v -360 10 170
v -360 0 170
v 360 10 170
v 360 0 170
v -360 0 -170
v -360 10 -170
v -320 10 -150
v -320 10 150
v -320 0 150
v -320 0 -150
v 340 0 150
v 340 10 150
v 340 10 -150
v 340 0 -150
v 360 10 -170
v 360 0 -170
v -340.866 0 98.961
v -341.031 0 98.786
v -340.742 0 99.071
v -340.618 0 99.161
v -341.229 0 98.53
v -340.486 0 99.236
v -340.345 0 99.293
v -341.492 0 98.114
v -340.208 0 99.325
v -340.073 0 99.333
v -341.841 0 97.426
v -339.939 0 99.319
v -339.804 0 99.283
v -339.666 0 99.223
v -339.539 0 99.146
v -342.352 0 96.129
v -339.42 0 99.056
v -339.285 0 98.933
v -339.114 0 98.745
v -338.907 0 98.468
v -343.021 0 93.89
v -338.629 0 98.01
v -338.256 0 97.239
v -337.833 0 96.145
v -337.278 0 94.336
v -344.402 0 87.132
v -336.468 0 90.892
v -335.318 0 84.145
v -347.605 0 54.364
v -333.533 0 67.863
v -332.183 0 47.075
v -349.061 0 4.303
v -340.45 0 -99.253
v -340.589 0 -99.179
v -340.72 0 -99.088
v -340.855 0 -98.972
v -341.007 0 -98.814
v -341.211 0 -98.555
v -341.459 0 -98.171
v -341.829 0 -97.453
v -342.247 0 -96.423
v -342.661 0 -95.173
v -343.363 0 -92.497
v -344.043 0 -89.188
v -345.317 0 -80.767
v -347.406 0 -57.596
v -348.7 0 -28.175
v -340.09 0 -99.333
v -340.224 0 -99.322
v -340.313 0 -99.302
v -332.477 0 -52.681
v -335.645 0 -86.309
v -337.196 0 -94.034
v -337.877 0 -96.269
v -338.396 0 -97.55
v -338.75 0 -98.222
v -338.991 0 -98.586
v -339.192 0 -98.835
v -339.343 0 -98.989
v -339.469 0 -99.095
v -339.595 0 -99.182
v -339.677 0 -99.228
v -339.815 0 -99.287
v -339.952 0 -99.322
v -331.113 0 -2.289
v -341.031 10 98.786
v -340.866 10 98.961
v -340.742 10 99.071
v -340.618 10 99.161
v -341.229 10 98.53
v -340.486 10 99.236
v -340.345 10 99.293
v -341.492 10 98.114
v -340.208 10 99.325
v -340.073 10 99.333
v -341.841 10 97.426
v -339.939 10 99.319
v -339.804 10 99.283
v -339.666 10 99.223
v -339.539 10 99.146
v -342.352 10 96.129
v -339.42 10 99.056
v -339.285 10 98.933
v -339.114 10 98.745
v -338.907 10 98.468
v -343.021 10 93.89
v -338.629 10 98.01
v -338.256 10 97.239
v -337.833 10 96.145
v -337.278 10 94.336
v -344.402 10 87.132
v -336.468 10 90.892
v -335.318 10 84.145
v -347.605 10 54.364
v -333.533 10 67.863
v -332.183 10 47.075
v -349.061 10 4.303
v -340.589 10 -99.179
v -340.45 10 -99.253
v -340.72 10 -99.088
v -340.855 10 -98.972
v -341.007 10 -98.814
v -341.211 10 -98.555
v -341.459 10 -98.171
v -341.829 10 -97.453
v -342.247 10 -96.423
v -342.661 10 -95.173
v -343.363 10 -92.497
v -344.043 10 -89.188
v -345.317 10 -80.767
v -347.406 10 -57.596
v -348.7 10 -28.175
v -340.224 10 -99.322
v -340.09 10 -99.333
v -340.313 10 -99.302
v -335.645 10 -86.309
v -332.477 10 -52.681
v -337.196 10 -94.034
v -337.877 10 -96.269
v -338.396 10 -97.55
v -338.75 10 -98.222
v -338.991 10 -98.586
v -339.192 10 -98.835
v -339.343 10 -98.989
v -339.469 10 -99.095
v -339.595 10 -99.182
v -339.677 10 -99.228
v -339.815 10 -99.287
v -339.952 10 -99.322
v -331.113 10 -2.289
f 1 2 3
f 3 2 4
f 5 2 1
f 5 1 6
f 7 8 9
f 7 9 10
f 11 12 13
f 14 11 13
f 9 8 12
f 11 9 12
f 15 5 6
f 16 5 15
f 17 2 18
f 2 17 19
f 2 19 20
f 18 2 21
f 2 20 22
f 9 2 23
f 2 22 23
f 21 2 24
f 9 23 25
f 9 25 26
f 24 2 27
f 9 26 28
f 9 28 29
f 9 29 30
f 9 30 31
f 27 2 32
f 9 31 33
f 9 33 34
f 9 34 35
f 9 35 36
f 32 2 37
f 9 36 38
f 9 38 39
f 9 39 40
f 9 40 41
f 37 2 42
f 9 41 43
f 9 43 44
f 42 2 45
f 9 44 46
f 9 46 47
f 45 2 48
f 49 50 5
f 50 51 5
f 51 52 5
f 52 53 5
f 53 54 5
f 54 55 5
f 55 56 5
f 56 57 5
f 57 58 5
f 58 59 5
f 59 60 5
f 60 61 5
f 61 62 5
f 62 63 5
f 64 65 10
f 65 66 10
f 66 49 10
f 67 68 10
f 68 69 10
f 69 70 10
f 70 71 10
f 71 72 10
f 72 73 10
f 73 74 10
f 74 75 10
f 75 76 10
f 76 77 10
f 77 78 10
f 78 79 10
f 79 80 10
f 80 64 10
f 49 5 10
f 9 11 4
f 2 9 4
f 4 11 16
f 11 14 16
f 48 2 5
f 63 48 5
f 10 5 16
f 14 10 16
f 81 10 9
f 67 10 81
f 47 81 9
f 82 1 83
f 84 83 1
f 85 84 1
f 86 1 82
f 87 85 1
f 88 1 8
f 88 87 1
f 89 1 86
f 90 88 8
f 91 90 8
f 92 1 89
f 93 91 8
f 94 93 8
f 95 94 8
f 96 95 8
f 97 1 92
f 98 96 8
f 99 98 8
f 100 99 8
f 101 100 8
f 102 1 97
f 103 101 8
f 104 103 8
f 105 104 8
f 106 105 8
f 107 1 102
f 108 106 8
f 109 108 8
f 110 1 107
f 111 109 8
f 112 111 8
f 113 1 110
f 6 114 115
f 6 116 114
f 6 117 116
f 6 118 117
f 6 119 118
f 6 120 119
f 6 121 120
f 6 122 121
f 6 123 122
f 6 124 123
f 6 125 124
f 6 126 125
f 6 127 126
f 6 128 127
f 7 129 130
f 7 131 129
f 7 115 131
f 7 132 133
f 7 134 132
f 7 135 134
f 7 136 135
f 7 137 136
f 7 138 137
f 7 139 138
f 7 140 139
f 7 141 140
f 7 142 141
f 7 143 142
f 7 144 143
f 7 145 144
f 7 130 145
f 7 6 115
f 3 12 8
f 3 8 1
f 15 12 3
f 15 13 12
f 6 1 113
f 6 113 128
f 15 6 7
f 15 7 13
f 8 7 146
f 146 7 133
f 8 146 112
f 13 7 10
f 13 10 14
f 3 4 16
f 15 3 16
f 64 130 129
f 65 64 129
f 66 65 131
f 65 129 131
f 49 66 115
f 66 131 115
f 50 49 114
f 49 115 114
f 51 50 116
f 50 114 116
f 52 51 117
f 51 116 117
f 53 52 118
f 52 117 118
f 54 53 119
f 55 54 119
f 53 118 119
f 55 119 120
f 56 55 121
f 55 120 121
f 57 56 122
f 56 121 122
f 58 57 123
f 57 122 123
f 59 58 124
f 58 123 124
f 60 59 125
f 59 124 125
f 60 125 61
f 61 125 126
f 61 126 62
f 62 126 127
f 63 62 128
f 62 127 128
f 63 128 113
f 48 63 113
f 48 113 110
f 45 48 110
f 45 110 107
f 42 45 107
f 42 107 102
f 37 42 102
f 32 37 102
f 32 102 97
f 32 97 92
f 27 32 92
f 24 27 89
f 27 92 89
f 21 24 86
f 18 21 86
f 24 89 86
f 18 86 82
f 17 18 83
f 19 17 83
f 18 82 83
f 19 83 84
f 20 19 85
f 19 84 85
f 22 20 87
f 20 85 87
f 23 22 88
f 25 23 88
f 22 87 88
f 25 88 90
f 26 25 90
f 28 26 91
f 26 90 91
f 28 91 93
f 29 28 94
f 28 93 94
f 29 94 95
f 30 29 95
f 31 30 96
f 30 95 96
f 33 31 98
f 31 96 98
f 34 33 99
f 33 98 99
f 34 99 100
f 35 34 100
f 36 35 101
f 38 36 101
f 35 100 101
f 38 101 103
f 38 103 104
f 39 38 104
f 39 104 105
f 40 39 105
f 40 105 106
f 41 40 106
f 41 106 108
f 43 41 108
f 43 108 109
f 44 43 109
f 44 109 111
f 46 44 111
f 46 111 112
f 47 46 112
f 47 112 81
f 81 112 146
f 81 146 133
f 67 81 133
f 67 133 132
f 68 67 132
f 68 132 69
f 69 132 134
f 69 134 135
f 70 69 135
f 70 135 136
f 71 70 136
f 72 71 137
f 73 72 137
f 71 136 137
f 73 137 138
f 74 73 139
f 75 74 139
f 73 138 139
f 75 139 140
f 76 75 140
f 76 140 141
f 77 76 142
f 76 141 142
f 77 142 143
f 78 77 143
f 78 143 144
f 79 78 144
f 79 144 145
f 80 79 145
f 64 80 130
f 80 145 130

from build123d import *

# Parameters (mm, degrees)
CROQUIS1_W              = 720
CROQUIS1_H              = 340
SALIENTE_EXTRUIR1_DEPTH = 10
CROQUIS3_RX             = 99.333174073
CROQUIS3_RY             = 8.979269973
CROQUIS3_W              = 660
CROQUIS3_H              = 300
CORTAR_EXTRUIR2_DEPTH   = 10


with BuildPart() as part:
    # Croquis1 → Saliente-Extruir1 (new body)
    with BuildSketch(Plane(origin=(0, 0, 0), x_dir=(1, 0, 0), z_dir=(0, 1, 0))):
        Rectangle(CROQUIS1_W, CROQUIS1_H)
    extrude(amount=SALIENTE_EXTRUIR1_DEPTH)

    # Croquis3 → Cortar-Extruir2 (cut)
    with BuildSketch(Plane(origin=(0, 10, 0), x_dir=(1, 0, 0), z_dir=(0, 1, 0))):
        with Locations(Location((-340.089850217, 0), (0, 0, 90))):
            Ellipse(CROQUIS3_RX, CROQUIS3_RY)
        with Locations((10, 0)):
            Rectangle(CROQUIS3_W, CROQUIS3_H)
    extrude(amount=-CORTAR_EXTRUIR2_DEPTH, mode=Mode.SUBTRACT)


solid = part.part
